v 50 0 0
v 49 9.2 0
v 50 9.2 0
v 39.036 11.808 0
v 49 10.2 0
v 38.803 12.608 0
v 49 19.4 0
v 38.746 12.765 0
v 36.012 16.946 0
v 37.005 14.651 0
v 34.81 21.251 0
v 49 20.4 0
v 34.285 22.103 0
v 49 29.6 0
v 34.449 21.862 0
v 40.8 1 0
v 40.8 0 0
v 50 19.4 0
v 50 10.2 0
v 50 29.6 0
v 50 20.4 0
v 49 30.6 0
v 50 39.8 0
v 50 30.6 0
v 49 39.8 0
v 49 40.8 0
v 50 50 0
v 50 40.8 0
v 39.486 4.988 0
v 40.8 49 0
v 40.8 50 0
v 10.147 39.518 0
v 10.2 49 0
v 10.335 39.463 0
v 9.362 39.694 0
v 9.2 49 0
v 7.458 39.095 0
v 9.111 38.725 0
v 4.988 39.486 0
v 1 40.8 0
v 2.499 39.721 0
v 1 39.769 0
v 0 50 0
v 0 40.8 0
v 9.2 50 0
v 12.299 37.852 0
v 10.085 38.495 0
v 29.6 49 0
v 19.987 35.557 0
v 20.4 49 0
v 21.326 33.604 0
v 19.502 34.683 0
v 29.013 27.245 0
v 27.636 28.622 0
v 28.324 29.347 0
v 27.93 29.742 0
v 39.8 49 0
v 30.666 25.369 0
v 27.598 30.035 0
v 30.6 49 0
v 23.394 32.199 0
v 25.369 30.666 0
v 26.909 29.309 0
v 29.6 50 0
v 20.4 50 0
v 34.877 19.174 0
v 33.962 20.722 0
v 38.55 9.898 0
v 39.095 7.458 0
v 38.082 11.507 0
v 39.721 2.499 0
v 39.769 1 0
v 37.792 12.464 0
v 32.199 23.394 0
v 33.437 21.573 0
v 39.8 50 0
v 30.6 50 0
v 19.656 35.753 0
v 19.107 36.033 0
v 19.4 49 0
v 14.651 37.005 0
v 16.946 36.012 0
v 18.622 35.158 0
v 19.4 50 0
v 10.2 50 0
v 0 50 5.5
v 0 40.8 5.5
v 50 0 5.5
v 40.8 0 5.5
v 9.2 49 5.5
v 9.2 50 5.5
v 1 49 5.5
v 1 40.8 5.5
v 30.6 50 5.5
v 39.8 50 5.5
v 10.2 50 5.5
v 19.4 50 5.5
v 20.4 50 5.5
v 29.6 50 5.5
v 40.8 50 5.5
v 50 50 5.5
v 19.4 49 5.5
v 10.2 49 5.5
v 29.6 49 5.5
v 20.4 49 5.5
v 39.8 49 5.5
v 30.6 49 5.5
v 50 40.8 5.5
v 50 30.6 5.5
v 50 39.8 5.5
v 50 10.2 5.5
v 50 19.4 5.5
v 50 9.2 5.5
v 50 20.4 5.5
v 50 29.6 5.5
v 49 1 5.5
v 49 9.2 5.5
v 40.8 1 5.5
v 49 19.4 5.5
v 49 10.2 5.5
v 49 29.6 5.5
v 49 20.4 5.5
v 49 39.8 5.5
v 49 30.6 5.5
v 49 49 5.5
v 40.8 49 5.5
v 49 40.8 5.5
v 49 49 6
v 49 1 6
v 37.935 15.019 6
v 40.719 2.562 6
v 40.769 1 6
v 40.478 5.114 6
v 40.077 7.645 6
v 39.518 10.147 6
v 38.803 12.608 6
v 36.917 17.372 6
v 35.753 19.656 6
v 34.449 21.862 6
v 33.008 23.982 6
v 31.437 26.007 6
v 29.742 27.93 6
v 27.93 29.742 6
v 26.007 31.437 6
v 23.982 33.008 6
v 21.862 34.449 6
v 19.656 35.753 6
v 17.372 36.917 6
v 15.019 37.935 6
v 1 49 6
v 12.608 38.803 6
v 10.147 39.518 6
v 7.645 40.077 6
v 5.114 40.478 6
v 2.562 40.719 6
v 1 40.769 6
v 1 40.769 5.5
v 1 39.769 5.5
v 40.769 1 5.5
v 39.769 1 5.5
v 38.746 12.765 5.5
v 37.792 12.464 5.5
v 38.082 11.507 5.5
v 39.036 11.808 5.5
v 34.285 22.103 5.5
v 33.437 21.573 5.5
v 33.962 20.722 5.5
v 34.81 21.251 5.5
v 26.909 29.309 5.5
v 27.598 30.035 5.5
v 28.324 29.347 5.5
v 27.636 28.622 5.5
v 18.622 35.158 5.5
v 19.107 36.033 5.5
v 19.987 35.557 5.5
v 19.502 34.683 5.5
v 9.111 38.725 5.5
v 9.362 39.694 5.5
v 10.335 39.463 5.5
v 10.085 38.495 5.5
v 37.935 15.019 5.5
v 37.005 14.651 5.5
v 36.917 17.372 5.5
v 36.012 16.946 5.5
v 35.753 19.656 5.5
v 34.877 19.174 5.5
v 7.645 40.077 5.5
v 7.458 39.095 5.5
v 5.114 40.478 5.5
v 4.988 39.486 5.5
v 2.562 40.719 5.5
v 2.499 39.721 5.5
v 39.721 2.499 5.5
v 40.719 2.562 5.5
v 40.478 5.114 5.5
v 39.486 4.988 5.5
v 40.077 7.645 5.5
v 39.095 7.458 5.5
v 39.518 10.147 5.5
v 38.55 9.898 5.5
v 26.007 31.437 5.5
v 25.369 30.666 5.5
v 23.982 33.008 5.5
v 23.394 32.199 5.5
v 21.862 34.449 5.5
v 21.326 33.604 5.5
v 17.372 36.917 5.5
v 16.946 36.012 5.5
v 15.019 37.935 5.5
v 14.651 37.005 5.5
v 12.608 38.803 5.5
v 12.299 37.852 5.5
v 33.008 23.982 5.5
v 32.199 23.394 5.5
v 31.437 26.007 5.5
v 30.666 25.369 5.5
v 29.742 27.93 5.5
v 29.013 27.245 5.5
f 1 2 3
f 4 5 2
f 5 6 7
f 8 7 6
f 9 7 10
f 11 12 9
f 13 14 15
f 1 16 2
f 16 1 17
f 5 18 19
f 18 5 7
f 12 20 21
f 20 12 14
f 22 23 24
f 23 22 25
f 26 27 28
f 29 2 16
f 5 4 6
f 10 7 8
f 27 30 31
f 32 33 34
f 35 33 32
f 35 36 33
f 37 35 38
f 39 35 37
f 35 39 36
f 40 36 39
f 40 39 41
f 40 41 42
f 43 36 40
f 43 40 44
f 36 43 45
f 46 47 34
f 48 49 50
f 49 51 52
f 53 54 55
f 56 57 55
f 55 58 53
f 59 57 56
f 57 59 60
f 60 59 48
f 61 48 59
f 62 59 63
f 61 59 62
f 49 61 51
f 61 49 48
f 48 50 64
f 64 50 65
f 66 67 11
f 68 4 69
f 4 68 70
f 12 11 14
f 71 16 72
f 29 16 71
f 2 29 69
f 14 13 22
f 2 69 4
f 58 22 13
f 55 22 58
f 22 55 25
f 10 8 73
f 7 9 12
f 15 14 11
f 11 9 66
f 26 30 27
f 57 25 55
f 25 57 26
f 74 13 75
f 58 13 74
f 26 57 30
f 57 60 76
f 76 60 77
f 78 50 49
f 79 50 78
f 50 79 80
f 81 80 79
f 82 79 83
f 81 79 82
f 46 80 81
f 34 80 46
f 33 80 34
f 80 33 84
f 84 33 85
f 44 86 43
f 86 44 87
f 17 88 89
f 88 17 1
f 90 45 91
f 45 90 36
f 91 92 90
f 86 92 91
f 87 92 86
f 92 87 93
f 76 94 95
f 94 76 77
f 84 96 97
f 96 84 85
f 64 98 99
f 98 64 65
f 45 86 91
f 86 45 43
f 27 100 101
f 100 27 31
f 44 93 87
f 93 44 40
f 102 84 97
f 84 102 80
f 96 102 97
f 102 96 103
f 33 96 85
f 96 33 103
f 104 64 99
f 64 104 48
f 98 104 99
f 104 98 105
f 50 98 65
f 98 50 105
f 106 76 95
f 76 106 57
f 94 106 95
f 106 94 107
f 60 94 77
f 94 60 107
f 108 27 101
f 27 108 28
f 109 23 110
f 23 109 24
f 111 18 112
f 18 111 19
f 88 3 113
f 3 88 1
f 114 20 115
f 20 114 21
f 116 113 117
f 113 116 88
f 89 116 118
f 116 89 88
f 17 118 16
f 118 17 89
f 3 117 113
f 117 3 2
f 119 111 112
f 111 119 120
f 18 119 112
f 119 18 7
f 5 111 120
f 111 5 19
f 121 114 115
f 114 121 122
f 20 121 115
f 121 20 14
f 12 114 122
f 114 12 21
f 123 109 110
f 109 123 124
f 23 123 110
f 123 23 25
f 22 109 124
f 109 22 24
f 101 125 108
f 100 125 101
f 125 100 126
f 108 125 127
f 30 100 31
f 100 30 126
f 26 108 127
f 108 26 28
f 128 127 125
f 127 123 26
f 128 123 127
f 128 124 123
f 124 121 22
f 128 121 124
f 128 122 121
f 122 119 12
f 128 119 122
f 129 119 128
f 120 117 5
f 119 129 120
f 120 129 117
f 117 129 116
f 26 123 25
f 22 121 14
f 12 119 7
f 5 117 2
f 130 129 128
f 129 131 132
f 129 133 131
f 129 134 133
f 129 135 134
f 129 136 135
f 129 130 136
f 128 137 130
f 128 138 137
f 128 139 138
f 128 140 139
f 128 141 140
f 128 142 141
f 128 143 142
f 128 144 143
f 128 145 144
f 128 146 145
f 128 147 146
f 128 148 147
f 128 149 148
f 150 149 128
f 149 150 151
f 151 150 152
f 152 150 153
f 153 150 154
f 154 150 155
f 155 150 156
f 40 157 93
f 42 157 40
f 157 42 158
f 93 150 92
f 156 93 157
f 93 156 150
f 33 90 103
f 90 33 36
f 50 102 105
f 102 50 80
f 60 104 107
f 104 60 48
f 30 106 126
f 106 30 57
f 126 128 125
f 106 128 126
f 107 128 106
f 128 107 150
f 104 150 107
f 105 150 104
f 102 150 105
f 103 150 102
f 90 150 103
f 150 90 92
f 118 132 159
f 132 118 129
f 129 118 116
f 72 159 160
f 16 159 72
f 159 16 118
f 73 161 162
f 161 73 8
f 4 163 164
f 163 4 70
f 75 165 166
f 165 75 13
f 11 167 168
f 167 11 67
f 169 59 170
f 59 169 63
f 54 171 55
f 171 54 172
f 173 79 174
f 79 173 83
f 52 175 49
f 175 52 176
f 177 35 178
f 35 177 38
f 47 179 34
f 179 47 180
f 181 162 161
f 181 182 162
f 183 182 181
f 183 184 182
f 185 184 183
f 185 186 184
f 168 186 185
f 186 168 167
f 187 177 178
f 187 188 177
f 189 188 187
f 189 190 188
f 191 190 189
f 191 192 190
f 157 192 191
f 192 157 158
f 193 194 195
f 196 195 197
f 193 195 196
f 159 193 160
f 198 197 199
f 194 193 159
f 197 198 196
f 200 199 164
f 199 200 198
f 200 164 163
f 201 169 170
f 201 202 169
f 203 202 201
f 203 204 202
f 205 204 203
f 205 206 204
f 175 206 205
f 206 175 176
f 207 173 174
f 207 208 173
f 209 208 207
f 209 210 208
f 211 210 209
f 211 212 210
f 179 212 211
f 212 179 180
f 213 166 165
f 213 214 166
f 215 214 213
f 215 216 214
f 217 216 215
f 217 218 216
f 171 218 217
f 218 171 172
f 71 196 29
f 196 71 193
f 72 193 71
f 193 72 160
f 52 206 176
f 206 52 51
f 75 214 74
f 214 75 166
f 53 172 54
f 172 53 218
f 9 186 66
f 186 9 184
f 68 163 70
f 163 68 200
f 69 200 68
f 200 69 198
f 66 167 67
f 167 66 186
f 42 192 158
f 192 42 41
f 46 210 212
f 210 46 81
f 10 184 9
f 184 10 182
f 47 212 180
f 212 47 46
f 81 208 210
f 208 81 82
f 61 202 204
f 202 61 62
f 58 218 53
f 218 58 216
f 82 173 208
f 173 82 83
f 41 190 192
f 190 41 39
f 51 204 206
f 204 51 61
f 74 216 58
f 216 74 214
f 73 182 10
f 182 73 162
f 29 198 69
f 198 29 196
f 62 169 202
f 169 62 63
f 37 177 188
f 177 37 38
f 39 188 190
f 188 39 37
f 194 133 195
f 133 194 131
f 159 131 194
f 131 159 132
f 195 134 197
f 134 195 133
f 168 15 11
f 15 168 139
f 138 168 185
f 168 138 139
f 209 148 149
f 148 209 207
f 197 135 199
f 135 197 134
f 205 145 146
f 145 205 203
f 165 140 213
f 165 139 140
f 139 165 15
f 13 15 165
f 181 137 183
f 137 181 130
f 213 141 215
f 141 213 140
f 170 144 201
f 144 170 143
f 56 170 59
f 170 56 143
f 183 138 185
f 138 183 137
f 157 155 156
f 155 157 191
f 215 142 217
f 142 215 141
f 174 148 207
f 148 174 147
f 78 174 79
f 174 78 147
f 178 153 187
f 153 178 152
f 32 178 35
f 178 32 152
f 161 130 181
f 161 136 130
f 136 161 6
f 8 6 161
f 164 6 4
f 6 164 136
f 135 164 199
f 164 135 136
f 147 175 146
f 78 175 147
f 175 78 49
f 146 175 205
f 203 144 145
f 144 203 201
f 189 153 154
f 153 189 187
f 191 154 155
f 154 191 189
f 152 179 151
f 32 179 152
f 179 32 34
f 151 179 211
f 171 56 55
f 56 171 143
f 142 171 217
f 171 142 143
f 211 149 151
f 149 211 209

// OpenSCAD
/* [Base Tile Size] */
x = 2; //[1,2,3,4]
y = 2; //[1,2,3,4]

/* [Edge Tile Support] */
// Size of edge tile addition, 9.2 is standard for openforge
edge_width = 12.5;
edge = "false"; // [false, true]

module full_base(x,y,edge_width=12.5, edge="false") {
    e = edge == "true"?edge_width:0;
    l = e;
    r = e;
    f = e;
    b = e;
    color("LightGrey") difference() {
        union() {
            difference() {
                union() {
                    translate([-l,-f,0]) difference() {
                        stone_base(x,y,edge_width,edge);
                        intersection() {
                            translate([-1,-1,-1]) cube([25*x-8.2+l+r,25*y-8.2+f+b,8]);
                            scale([x < y ? ((25*x)-1)/((25*y)-1) : 1, y < x ? ((25*y)-1)/((25*x)-1) : 1,1]) translate([0,0,-1]) cylinder(10,max([x, y])*25-1, max([x,y])*25-1,$fn=100);
                        }
                    }
                    difference() {
                        union() {
                            intersection() {
                                translate([0,0,0]) difference() {
                                    scale([x < y ? ((25*x)-1)/((25*y)-1) : 1, y < x ? ((25*y)-1)/((25*x)-1) : 1,1]) translate([0,0,0]) cylinder(5.5,max([x, y])*25-1, max([x,y])*25-1,$fn=100);
                                    scale([x < y ? ((25*x)-10.2)/((25*y)-10.2) : 1, y < x ? ((25*y)-10.2)/((25*x)-10.2) : 1,1]) translate([0,0,-1]) cylinder(10,max([x, y])*25-10.2, max([x,y])*25-10.2,$fn=100);
                                    if(x == 1) {
                                        if(y == 1) {
                                            translate([0,-.5,0]) rotate([0,0,50]) translate([0,0,-1]) cube([25*(max(x,y))+1,1,8]);
                                        } else if(y == 2) {
                                            translate([0,10.2*0.5,0]) rotate([0,0,0]) translate([0,0,-1]) cube([25*(max(x,y))+1,1,8]);
                                            translate([0,10.2*1.5-3,0]) rotate([0,0,8]) translate([0,0,-1]) cube([25*(max(x,y))+1,1,8]);
                                            translate([0,10.2*2.5-5,0]) rotate([0,0,17]) translate([0,0,-1]) cube([25*(max(x,y))+1,1,8]);
                                            translate([0,10.2*3.5-6,0]) rotate([0,0,28]) translate([0,0,-1]) cube([25*(max(x,y))+1,1,8]);
                                        } else if(y == 3) {
                                            translate([0,10.2*0.775-.5,0]) rotate([0,0,1]) translate([0,0,-1]) cube([25*(max(x,y))+1,1,8]);
                                            translate([0,10.2*1.8-1.5,0]) rotate([0,0,4]) translate([0,0,-1]) cube([25*(max(x,y))+1,1,8]);
                                            translate([0,10.2*2.825-2.5,0]) rotate([0,0,6]) translate([0,0,-1]) cube([25*(max(x,y))+1,1,8]);
                                            translate([0,10.2*3.85-3,0]) rotate([0,0,8]) translate([0,0,-1]) cube([25*(max(x,y))+1,1,8]);
                                            translate([0,10.2*4.875-3,0]) rotate([0,0,10]) translate([0,0,-1]) cube([25*(max(x,y))+1,1,8]);
                                            translate([0,10.2*5.9-3,0]) rotate([0,0,14]) translate([0,0,-1]) cube([25*(max(x,y))+1,1,8]);
                                        } else if(y == 4) {
                                            translate([0,10.2*1.2-1,0]) rotate([0,0,1]) translate([0,0,-1]) cube([25*(max(x,y))+1,1,8]);
                                            translate([0,10.2*2.2-2,0]) rotate([0,0,4]) translate([0,0,-1]) cube([25*(max(x,y))+1,1,8]);
                                            translate([0,10.2*3.2-2.5,0]) rotate([0,0,6]) translate([0,0,-1]) cube([25*(max(x,y))+1,1,8]);
                                            translate([0,10.2*4.2-3,0]) rotate([0,0,8]) translate([0,0,-1]) cube([25*(max(x,y))+1,1,8]);
                                            translate([0,10.2*5.2-3.5,0]) rotate([0,0,10]) translate([0,0,-1]) cube([25*(max(x,y))+1,1,8]);
                                            translate([0,10.2*6.2-4.5,0]) rotate([0,0,14]) translate([0,0,-1]) cube([25*(max(x,y))+1,1,8]);
                                            translate([0,10.2*7.2-4.5,0]) rotate([0,0,16]) translate([0,0,-1]) cube([25*(max(x,y))+1,1,8]);
                                            translate([0,10.2*8.2-4.25,0]) rotate([0,0,20]) translate([0,0,-1]) cube([25*(max(x,y))+1,1,8]);
                                        }
                                    } else if(x == 2) {
                                        if(y == 1) {
                                            translate([10.2*0.5,0,0]) rotate([0,0,90-0]) translate([0,0,-1]) cube([25*(max(x,y))+1,1,8]);
                                            translate([10.2*1.5-3,0,0]) rotate([0,0,90-8]) translate([0,0,-1]) cube([25*(max(x,y))+1,1,8]);
                                            translate([10.2*2.5-5,0,0]) rotate([0,0,90-17]) translate([0,0,-1]) cube([25*(max(x,y))+1,1,8]);
                                            translate([10.2*3.5-6,0,0]) rotate([0,0,90-28]) translate([0,0,-1]) cube([25*(max(x,y))+1,1,8]);
                                        } else if(y == 2) {
                                            translate([0,-.5,0]) rotate([0,0,17.5]) translate([0,0,-1]) cube([25*(max(x,y))+1,1,8]);
                                            translate([0,-.5,0]) rotate([0,0,32]) translate([0,0,-1]) cube([25*(max(x,y))+1,1,8]);
                                            translate([0,-.5,0]) rotate([0,0,46.5]) translate([0,0,-1]) cube([25*(max(x,y))+1,1,8]);
                                            translate([0,-.5,0]) rotate([0,0,61]) translate([0,0,-1]) cube([25*(max(x,y))+1,1,8]);
                                            translate([0,-.5,0]) rotate([0,0,75.5]) translate([0,0,-1]) cube([25*(max(x,y))+1,1,8]);
                                        } else if(y == 3) {
                                            translate([0,10.2*1.2-4,0]) rotate([0,0,5.5]) translate([0,0,-1]) cube([25*(max(x,y))+1,1,8]);
                                            translate([0,10.2*2.2-6,0]) rotate([0,0,9]) translate([0,0,-1]) cube([25*(max(x,y))+1,1,8]);
                                            translate([0,10.2*3.2-8,0]) rotate([0,0,13.25]) translate([0,0,-1]) cube([25*(max(x,y))+1,1,8]);
                                            translate([0,10.2*4.2-15.7,0]) rotate([0,0,25]) translate([0,0,-1]) cube([25*(max(x,y))+1,1,8]);
                                            translate([0,10.2*5.2-20.5,0]) rotate([0,0,35]) translate([0,0,-1]) cube([25*(max(x,y))+1,1,8]);
                                            translate([0,10.2*6.2-23.5,0]) rotate([0,0,45]) translate([0,0,-1]) cube([25*(max(x,y))+1,1,8]);
                                            translate([0,10.2*7.2-26,0]) rotate([0,0,60.5]) translate([0,0,-1]) cube([25*(max(x,y))+1,1,8]);
                                        } else if(y == 4) {
                                            translate([0,10.2*0.5-3,0]) rotate([0,0,2]) translate([0,0,-1]) cube([25*(max(x,y))+1,1,8]);
                                            translate([0,10.2*1.5-7,0]) rotate([0,0,7]) translate([0,0,-1]) cube([25*(max(x,y))+1,1,8]);
                                            translate([0,10.2*2.5-10.5,0]) rotate([0,0,12]) translate([0,0,-1]) cube([25*(max(x,y))+1,1,8]);
                                            translate([0,10.2*3.5-14.25,0]) rotate([0,0,17]) translate([0,0,-1]) cube([25*(max(x,y))+1,1,8]);
                                            translate([0,10.2*4.5-16.5,0]) rotate([0,0,21]) translate([0,0,-1]) cube([25*(max(x,y))+1,1,8]);
                                            translate([0,10.2*5.5-18.5,0]) rotate([0,0,25]) translate([0,0,-1]) cube([25*(max(x,y))+1,1,8]);
                                            translate([0,10.2*6.5-22,0]) rotate([0,0,32]) translate([0,0,-1]) cube([25*(max(x,y))+1,1,8]);
                                            translate([0,10.2*7.5-21.5-.25,0]) rotate([0,0,36]) translate([0,0,-1]) cube([25*(max(x,y))+1,1,8]);
                                            translate([0,10.2*8.5-19.25,0]) rotate([0,0,39]) translate([0,0,-1]) cube([25*(max(x,y))+1,1,8]);
                                            translate([0,10.2*9.5-21,0]) rotate([0,0,55]) translate([0,0,-1]) cube([25*(max(x,y))+1,1,8]);
                                        }
                                    } else if(x == 3) {
                                        if(y == 1) {
                                            translate([10.2*0.775-.5,0,0]) rotate([0,0,90-1]) translate([0,0,-1]) cube([25*(max(x,y))+1,1,8]);
                                            translate([10.2*1.8-1.5,0,0]) rotate([0,0,90-4]) translate([0,0,-1]) cube([25*(max(x,y))+1,1,8]);
                                            translate([10.2*2.825-2.5,0,0]) rotate([0,0,90-6]) translate([0,0,-1]) cube([25*(max(x,y))+1,1,8]);
                                            translate([10.2*3.85-3,0,0]) rotate([0,0,90-8]) translate([0,0,-1]) cube([25*(max(x,y))+1,1,8]);
                                            translate([10.2*4.875-3,0,0]) rotate([0,0,90-10]) translate([0,0,-1]) cube([25*(max(x,y))+1,1,8]);
                                            translate([10.2*5.9-3,0,0]) rotate([0,0,90-14]) translate([0,0,-1]) cube([25*(max(x,y))+1,1,8]);
                                        } else if(y == 2) {
                                            translate([10.2*1.2-4,0,0]) rotate([0,0,90-5.5]) translate([0,0,-1]) cube([25*(max(x,y))+1,1,8]);
                                            translate([10.2*2.2-6,0,0]) rotate([0,0,90-9]) translate([0,0,-1]) cube([25*(max(x,y))+1,1,8]);
                                            translate([10.2*3.2-8,0,0]) rotate([0,0,90-13.25]) translate([0,0,-1]) cube([25*(max(x,y))+1,1,8]);
                                            translate([10.2*4.2-15.7,0,0]) rotate([0,0,90-25]) translate([0,0,-1]) cube([25*(max(x,y))+1,1,8]);
                                            translate([10.2*5.2-20.5,0,0]) rotate([0,0,90-35]) translate([0,0,-1]) cube([25*(max(x,y))+1,1,8]);
                                            translate([10.2*6.2-23.5,0,0]) rotate([0,0,90-45]) translate([0,0,-1]) cube([25*(max(x,y))+1,1,8]);
                                            translate([10.2*7.2-26,0,0]) rotate([0,0,90-60.5]) translate([0,0,-1]) cube([25*(max(x,y))+1,1,8]);
                                        } else if(y == 3) {
                                            translate([0,-.5,0]) rotate([0,0,9]) translate([0,0,-1]) cube([25*(max(x,y))+1,1,8]);
                                            translate([0,-.5,0]) rotate([0,0,18]) translate([0,0,-1]) cube([25*(max(x,y))+1,1,8]);
                                            translate([0,-.5,0]) rotate([0,0,27]) translate([0,0,-1]) cube([25*(max(x,y))+1,1,8]);
                                            translate([0,-.5,0]) rotate([0,0,36]) translate([0,0,-1]) cube([25*(max(x,y))+1,1,8]);
                                            translate([0,-.5,0]) rotate([0,0,45]) translate([0,0,-1]) cube([25*(max(x,y))+1,1,8]);
                                            translate([0,-.5,0]) rotate([0,0,54]) translate([0,0,-1]) cube([25*(max(x,y))+1,1,8]);
                                            translate([0,-.5,0]) rotate([0,0,63]) translate([0,0,-1]) cube([25*(max(x,y))+1,1,8]);
                                            translate([0,-.5,0]) rotate([0,0,72]) translate([0,0,-1]) cube([25*(max(x,y))+1,1,8]);
                                            translate([0,-.5,0]) rotate([0,0,81]) translate([0,0,-1]) cube([25*(max(x,y))+1,1,8]);
                                        } else if(y == 4) {
                                            translate([0,10.2*1-2,0]) rotate([0,0,2]) translate([0,0,-1]) cube([25*(max(x,y))+1,1,8]);
                                            translate([0,10.2*2-7.5,0]) rotate([0,0,7]) translate([0,0,-1]) cube([25*(max(x,y))+1,1,8]);
                                            translate([0,10.2*3-12.75,0]) rotate([0,0,12]) translate([0,0,-1]) cube([25*(max(x,y))+1,1,8]);
                                            translate([0,10.2*4-14.25-3.75,0]) rotate([0,0,17]) translate([0,0,-1]) cube([25*(max(x,y))+1,1,8]);
                                            translate([0,10.2*5-16.5-9,0]) rotate([0,0,24]) translate([0,0,-1]) cube([25*(max(x,y))+1,1,8]);
                                            translate([0,10.2*6-18.5-10.25,0]) rotate([0,0,28]) translate([0,0,-1]) cube([25*(max(x,y))+1,1,8]);
                                            translate([0,10.2*7-22-17,0]) rotate([0,0,38]) translate([0,0,-1]) cube([25*(max(x,y))+1,1,8]);
                                            translate([0,10.2*8-21.5-20.5,0]) rotate([0,0,44]) translate([0,0,-1]) cube([25*(max(x,y))+1,1,8]);
                                            translate([0,10.2*9-19.25-32,0]) rotate([0,0,55]) translate([0,0,-1]) cube([25*(max(x,y))+1,1,8]);
                                            translate([0,10.2*10-58,0]) rotate([0,0,65]) translate([0,0,-1]) cube([25*(max(x,y))+1,1,8]);
                                            translate([0,10.2*11-59,0]) rotate([0,0,75]) translate([0,0,-1]) cube([25*(max(x,y))+1,1,8]);
                                        }
                                    } else if(x == 4) {
                                        if(y == 1) {
                                            translate([10.2*1.2-1,0,0]) rotate([0,0,90-1]) translate([0,0,-1]) cube([25*(max(x,y))+1,1,8]);
                                            translate([10.2*2.2-2,0,0]) rotate([0,0,90-4]) translate([0,0,-1]) cube([25*(max(x,y))+1,1,8]);
                                            translate([10.2*3.2-2.5,0,0]) rotate([0,0,90-6]) translate([0,0,-1]) cube([25*(max(x,y))+1,1,8]);
                                            translate([10.2*4.2-3,0,0]) rotate([0,0,90-8]) translate([0,0,-1]) cube([25*(max(x,y))+1,1,8]);
                                            translate([10.2*5.2-3.5,0,0]) rotate([0,0,90-10]) translate([0,0,-1]) cube([25*(max(x,y))+1,1,8]);
                                            translate([10.2*6.2-4.5,0,0]) rotate([0,0,90-14]) translate([0,0,-1]) cube([25*(max(x,y))+1,1,8]);
                                            translate([10.2*7.2-4.5,0,0]) rotate([0,0,90-16]) translate([0,0,-1]) cube([25*(max(x,y))+1,1,8]);
                                            translate([10.2*8.2-4.25,0,0]) rotate([0,0,90-20]) translate([0,0,-1]) cube([25*(max(x,y))+1,1,8]);
                                        } else if(y == 2) {
                                            translate([10.2*0.5-3,0,0]) rotate([0,0,90-2]) translate([0,0,-1]) cube([25*(max(x,y))+1,1,8]);
                                            translate([10.2*1.5-7,0,0]) rotate([0,0,90-7]) translate([0,0,-1]) cube([25*(max(x,y))+1,1,8]);
                                            translate([10.2*2.5-10.5,0,0]) rotate([0,0,90-12]) translate([0,0,-1]) cube([25*(max(x,y))+1,1,8]);
                                            translate([10.2*3.5-14.25,0,0]) rotate([0,0,90-17]) translate([0,0,-1]) cube([25*(max(x,y))+1,1,8]);
                                            translate([10.2*4.5-16.5,0,0]) rotate([0,0,90-21]) translate([0,0,-1]) cube([25*(max(x,y))+1,1,8]);
                                            translate([10.2*5.5-18.5,0,0]) rotate([0,0,90-25]) translate([0,0,-1]) cube([25*(max(x,y))+1,1,8]);
                                            translate([10.2*6.5-22,0,0]) rotate([0,0,90-32]) translate([0,0,-1]) cube([25*(max(x,y))+1,1,8]);
                                            translate([10.2*7.5-21.5-.25,0,0]) rotate([0,0,90-36]) translate([0,0,-1]) cube([25*(max(x,y))+1,1,8]);
                                            translate([10.2*8.5-19.25,0,0]) rotate([0,0,90-39]) translate([0,0,-1]) cube([25*(max(x,y))+1,1,8]);
                                            translate([10.2*9.5-21,0,0]) rotate([0,0,90-55]) translate([0,0,-1]) cube([25*(max(x,y))+1,1,8]);
                                        } else if(y == 3) {
                                            translate([10.2*1-2,0,0]) rotate([0,0,90-2]) translate([0,0,-1]) cube([25*(max(x,y))+1,1,8]);
                                            translate([10.2*2-7.5,0,0]) rotate([0,0,90-7]) translate([0,0,-1]) cube([25*(max(x,y))+1,1,8]);
                                            translate([10.2*3-12.75,0,0]) rotate([0,0,90-12]) translate([0,0,-1]) cube([25*(max(x,y))+1,1,8]);
                                            translate([10.2*4-14.25-3.75,0,0]) rotate([0,0,90-17]) translate([0,0,-1]) cube([25*(max(x,y))+1,1,8]);
                                            translate([10.2*5-16.5-9,0,0]) rotate([0,0,90-24]) translate([0,0,-1]) cube([25*(max(x,y))+1,1,8]);
                                            translate([10.2*6-18.5-10.25,0,0]) rotate([0,0,90-28]) translate([0,0,-1]) cube([25*(max(x,y))+1,1,8]);
                                            translate([10.2*7-22-17,0,0]) rotate([0,0,90-38]) translate([0,0,-1]) cube([25*(max(x,y))+1,1,8]);
                                            translate([10.2*8-21.5-20.5,0,0]) rotate([0,0,90-44]) translate([0,0,-1]) cube([25*(max(x,y))+1,1,8]);
                                            translate([10.2*9-19.25-32,0,0]) rotate([0,0,90-55]) translate([0,0,-1]) cube([25*(max(x,y))+1,1,8]);
                                            translate([10.2*10-58,0,0]) rotate([0,0,90-65]) translate([0,0,-1]) cube([25*(max(x,y))+1,1,8]);
                                            translate([10.2*11-59,0,0]) rotate([0,0,90-75]) translate([0,0,-1]) cube([25*(max(x,y))+1,1,8]);
                                        } else if(y == 4) {
                                            translate([0,-.5,0]) rotate([0,0,90/14-.0625*12]) translate([0,0,-1]) cube([25*(max(x,y))+1,1,8]);
                                            translate([0,-.5,0]) rotate([0,0,90/14*2-.0625*11]) translate([0,0,-1]) cube([25*(max(x,y))+1,1,8]);
                                            translate([0,-.5,0]) rotate([0,0,90/14*3-.0625*10]) translate([0,0,-1]) cube([25*(max(x,y))+1,1,8]);
                                            translate([0,-.5,0]) rotate([0,0,90/14*4-.0625*9]) translate([0,0,-1]) cube([25*(max(x,y))+1,1,8]);
                                            translate([0,-.5,0]) rotate([0,0,90/14*5-.0625*8]) translate([0,0,-1]) cube([25*(max(x,y))+1,1,8]);
                                            translate([0,-.5,0]) rotate([0,0,90/14*6-.0625*7]) translate([0,0,-1]) cube([25*(max(x,y))+1,1,8]);
                                            translate([0,-.5,0]) rotate([0,0,90/14*7-.0625*6]) translate([0,0,-1]) cube([25*(max(x,y))+1,1,8]);
                                            translate([0,-.5,0]) rotate([0,0,90/14*8-.0625*5]) translate([0,0,-1]) cube([25*(max(x,y))+1,1,8]);
                                            translate([0,-.5,0]) rotate([0,0,90/14*9-.0625*4]) translate([0,0,-1]) cube([25*(max(x,y))+1,1,8]);
                                            translate([0,-.5,0]) rotate([0,0,90/14*10-.0625*3]) translate([0,0,-1]) cube([25*(max(x,y))+1,1,8]);
                                            translate([0,-.5,0]) rotate([0,0,90/14*11-.0625*2]) translate([0,0,-1]) cube([25*(max(x,y))+1,1,8]);
                                            translate([0,-.5,0]) rotate([0,0,90/14*12-.0625]) translate([0,0,-1]) cube([25*(max(x,y))+1,1,8]);
                                            translate([0,-.5,0]) rotate([0,0,90/14*13]) translate([0,0,-1]) cube([25*(max(x,y))+1,1,8]);
                                        }
                                    }
                                }
                                translate([1,1,0]) cube([25*x,25*y,10]);
                            }
                            intersection() {
                                translate([0,0,0]) difference() {
                                    scale([x < y ? ((25*x)-1)/((25*y)-1) : 1, y < x ? ((25*y)-1)/((25*x)-1) : 1,1]) translate([0,0,0]) cylinder(6,max([x, y])*25-1, max([x,y])*25-1,$fn=100);
                                    scale([x < y ? ((25*x)-9.2)/((25*y)-9.2) : 1, y < x ? ((25*y)-9.2)/((25*x)-9.2) : 1,1]) translate([0,0,-1]) cylinder(10,max([x, y])*25-9.2, max([x,y])*25-9.2,$fn=100);
                                }
                                translate([1,1,0]) cube([25*x,25*y,10]);
                            }
                            translate([1-l,y*25+b-2,0]) cube([x*25+r+l-2,1,6]);
                            translate([x*25+r-2,1-f,0]) cube([1,y*25+b+f-2,6]);
                        }
                        
                    }
                }
            }
            difference() {
                translate([-l,-f,0]) difference() {
                    translate([1,1,0]) cube([25*x+l+r-2,25*y+f+b-2,0.5]);
                    translate([7,7,-1]) cube([25*x-14+l+r,25*y-14+f+b,8]);
                }
                translate([0,0,-1]) scale([x < y ? ((25*x)-9.2)/((25*y)-9.2) : 1, y < x ? ((25*y)-10.2)/((25*x)-9.2) : 1,1]) translate([0,0,0]) cylinder(6,max([x, y])*25-9.2, max([x,y])*25-9.2,$fn=100);
            }
        }
        scale([x < y ? ((25*x)-10.2)/((25*y)-10.2) : 1, y < x ? ((25*y)-10.2)/((25*x)-10.2) : 1,1]) translate([0,0,0]) cylinder(10,max([x, y])*25-10.2, max([x,y])*25-10.2,$fn=100);
    }
}

module stone_base(x,y, left_edge="false",right_edge="false",front_edge="false",back_edge="false",edge=12.5) {
    l = left_edge == "true"?edge:0;
    r = right_edge == "true"?edge:0;
    f = front_edge == "true"?edge:0;
    b = back_edge == "true"?edge:0;
    length = 25*x+l+r;
    width = 25*y+f+b;
    xblocks = floor(length / 10.2);
    yblocks = floor(width / 10.2);
    
    intersection() {
        union() {
            for (i = [0:xblocks]) {
                for (j = [0:yblocks]) {
                    if (i == 0 || j == 0 || i == xblocks || j == yblocks) {
                        translate([i*10.2,j*10.2,0]) cube([9.2,9.2,5.5]);
                    }
                }
            }
        }
        cube([length, width, 6]);
    }
    translate([1,1,0]) cube([length-2, width-2, 6]);
}


full_base(x,y,edge_width,edge);
